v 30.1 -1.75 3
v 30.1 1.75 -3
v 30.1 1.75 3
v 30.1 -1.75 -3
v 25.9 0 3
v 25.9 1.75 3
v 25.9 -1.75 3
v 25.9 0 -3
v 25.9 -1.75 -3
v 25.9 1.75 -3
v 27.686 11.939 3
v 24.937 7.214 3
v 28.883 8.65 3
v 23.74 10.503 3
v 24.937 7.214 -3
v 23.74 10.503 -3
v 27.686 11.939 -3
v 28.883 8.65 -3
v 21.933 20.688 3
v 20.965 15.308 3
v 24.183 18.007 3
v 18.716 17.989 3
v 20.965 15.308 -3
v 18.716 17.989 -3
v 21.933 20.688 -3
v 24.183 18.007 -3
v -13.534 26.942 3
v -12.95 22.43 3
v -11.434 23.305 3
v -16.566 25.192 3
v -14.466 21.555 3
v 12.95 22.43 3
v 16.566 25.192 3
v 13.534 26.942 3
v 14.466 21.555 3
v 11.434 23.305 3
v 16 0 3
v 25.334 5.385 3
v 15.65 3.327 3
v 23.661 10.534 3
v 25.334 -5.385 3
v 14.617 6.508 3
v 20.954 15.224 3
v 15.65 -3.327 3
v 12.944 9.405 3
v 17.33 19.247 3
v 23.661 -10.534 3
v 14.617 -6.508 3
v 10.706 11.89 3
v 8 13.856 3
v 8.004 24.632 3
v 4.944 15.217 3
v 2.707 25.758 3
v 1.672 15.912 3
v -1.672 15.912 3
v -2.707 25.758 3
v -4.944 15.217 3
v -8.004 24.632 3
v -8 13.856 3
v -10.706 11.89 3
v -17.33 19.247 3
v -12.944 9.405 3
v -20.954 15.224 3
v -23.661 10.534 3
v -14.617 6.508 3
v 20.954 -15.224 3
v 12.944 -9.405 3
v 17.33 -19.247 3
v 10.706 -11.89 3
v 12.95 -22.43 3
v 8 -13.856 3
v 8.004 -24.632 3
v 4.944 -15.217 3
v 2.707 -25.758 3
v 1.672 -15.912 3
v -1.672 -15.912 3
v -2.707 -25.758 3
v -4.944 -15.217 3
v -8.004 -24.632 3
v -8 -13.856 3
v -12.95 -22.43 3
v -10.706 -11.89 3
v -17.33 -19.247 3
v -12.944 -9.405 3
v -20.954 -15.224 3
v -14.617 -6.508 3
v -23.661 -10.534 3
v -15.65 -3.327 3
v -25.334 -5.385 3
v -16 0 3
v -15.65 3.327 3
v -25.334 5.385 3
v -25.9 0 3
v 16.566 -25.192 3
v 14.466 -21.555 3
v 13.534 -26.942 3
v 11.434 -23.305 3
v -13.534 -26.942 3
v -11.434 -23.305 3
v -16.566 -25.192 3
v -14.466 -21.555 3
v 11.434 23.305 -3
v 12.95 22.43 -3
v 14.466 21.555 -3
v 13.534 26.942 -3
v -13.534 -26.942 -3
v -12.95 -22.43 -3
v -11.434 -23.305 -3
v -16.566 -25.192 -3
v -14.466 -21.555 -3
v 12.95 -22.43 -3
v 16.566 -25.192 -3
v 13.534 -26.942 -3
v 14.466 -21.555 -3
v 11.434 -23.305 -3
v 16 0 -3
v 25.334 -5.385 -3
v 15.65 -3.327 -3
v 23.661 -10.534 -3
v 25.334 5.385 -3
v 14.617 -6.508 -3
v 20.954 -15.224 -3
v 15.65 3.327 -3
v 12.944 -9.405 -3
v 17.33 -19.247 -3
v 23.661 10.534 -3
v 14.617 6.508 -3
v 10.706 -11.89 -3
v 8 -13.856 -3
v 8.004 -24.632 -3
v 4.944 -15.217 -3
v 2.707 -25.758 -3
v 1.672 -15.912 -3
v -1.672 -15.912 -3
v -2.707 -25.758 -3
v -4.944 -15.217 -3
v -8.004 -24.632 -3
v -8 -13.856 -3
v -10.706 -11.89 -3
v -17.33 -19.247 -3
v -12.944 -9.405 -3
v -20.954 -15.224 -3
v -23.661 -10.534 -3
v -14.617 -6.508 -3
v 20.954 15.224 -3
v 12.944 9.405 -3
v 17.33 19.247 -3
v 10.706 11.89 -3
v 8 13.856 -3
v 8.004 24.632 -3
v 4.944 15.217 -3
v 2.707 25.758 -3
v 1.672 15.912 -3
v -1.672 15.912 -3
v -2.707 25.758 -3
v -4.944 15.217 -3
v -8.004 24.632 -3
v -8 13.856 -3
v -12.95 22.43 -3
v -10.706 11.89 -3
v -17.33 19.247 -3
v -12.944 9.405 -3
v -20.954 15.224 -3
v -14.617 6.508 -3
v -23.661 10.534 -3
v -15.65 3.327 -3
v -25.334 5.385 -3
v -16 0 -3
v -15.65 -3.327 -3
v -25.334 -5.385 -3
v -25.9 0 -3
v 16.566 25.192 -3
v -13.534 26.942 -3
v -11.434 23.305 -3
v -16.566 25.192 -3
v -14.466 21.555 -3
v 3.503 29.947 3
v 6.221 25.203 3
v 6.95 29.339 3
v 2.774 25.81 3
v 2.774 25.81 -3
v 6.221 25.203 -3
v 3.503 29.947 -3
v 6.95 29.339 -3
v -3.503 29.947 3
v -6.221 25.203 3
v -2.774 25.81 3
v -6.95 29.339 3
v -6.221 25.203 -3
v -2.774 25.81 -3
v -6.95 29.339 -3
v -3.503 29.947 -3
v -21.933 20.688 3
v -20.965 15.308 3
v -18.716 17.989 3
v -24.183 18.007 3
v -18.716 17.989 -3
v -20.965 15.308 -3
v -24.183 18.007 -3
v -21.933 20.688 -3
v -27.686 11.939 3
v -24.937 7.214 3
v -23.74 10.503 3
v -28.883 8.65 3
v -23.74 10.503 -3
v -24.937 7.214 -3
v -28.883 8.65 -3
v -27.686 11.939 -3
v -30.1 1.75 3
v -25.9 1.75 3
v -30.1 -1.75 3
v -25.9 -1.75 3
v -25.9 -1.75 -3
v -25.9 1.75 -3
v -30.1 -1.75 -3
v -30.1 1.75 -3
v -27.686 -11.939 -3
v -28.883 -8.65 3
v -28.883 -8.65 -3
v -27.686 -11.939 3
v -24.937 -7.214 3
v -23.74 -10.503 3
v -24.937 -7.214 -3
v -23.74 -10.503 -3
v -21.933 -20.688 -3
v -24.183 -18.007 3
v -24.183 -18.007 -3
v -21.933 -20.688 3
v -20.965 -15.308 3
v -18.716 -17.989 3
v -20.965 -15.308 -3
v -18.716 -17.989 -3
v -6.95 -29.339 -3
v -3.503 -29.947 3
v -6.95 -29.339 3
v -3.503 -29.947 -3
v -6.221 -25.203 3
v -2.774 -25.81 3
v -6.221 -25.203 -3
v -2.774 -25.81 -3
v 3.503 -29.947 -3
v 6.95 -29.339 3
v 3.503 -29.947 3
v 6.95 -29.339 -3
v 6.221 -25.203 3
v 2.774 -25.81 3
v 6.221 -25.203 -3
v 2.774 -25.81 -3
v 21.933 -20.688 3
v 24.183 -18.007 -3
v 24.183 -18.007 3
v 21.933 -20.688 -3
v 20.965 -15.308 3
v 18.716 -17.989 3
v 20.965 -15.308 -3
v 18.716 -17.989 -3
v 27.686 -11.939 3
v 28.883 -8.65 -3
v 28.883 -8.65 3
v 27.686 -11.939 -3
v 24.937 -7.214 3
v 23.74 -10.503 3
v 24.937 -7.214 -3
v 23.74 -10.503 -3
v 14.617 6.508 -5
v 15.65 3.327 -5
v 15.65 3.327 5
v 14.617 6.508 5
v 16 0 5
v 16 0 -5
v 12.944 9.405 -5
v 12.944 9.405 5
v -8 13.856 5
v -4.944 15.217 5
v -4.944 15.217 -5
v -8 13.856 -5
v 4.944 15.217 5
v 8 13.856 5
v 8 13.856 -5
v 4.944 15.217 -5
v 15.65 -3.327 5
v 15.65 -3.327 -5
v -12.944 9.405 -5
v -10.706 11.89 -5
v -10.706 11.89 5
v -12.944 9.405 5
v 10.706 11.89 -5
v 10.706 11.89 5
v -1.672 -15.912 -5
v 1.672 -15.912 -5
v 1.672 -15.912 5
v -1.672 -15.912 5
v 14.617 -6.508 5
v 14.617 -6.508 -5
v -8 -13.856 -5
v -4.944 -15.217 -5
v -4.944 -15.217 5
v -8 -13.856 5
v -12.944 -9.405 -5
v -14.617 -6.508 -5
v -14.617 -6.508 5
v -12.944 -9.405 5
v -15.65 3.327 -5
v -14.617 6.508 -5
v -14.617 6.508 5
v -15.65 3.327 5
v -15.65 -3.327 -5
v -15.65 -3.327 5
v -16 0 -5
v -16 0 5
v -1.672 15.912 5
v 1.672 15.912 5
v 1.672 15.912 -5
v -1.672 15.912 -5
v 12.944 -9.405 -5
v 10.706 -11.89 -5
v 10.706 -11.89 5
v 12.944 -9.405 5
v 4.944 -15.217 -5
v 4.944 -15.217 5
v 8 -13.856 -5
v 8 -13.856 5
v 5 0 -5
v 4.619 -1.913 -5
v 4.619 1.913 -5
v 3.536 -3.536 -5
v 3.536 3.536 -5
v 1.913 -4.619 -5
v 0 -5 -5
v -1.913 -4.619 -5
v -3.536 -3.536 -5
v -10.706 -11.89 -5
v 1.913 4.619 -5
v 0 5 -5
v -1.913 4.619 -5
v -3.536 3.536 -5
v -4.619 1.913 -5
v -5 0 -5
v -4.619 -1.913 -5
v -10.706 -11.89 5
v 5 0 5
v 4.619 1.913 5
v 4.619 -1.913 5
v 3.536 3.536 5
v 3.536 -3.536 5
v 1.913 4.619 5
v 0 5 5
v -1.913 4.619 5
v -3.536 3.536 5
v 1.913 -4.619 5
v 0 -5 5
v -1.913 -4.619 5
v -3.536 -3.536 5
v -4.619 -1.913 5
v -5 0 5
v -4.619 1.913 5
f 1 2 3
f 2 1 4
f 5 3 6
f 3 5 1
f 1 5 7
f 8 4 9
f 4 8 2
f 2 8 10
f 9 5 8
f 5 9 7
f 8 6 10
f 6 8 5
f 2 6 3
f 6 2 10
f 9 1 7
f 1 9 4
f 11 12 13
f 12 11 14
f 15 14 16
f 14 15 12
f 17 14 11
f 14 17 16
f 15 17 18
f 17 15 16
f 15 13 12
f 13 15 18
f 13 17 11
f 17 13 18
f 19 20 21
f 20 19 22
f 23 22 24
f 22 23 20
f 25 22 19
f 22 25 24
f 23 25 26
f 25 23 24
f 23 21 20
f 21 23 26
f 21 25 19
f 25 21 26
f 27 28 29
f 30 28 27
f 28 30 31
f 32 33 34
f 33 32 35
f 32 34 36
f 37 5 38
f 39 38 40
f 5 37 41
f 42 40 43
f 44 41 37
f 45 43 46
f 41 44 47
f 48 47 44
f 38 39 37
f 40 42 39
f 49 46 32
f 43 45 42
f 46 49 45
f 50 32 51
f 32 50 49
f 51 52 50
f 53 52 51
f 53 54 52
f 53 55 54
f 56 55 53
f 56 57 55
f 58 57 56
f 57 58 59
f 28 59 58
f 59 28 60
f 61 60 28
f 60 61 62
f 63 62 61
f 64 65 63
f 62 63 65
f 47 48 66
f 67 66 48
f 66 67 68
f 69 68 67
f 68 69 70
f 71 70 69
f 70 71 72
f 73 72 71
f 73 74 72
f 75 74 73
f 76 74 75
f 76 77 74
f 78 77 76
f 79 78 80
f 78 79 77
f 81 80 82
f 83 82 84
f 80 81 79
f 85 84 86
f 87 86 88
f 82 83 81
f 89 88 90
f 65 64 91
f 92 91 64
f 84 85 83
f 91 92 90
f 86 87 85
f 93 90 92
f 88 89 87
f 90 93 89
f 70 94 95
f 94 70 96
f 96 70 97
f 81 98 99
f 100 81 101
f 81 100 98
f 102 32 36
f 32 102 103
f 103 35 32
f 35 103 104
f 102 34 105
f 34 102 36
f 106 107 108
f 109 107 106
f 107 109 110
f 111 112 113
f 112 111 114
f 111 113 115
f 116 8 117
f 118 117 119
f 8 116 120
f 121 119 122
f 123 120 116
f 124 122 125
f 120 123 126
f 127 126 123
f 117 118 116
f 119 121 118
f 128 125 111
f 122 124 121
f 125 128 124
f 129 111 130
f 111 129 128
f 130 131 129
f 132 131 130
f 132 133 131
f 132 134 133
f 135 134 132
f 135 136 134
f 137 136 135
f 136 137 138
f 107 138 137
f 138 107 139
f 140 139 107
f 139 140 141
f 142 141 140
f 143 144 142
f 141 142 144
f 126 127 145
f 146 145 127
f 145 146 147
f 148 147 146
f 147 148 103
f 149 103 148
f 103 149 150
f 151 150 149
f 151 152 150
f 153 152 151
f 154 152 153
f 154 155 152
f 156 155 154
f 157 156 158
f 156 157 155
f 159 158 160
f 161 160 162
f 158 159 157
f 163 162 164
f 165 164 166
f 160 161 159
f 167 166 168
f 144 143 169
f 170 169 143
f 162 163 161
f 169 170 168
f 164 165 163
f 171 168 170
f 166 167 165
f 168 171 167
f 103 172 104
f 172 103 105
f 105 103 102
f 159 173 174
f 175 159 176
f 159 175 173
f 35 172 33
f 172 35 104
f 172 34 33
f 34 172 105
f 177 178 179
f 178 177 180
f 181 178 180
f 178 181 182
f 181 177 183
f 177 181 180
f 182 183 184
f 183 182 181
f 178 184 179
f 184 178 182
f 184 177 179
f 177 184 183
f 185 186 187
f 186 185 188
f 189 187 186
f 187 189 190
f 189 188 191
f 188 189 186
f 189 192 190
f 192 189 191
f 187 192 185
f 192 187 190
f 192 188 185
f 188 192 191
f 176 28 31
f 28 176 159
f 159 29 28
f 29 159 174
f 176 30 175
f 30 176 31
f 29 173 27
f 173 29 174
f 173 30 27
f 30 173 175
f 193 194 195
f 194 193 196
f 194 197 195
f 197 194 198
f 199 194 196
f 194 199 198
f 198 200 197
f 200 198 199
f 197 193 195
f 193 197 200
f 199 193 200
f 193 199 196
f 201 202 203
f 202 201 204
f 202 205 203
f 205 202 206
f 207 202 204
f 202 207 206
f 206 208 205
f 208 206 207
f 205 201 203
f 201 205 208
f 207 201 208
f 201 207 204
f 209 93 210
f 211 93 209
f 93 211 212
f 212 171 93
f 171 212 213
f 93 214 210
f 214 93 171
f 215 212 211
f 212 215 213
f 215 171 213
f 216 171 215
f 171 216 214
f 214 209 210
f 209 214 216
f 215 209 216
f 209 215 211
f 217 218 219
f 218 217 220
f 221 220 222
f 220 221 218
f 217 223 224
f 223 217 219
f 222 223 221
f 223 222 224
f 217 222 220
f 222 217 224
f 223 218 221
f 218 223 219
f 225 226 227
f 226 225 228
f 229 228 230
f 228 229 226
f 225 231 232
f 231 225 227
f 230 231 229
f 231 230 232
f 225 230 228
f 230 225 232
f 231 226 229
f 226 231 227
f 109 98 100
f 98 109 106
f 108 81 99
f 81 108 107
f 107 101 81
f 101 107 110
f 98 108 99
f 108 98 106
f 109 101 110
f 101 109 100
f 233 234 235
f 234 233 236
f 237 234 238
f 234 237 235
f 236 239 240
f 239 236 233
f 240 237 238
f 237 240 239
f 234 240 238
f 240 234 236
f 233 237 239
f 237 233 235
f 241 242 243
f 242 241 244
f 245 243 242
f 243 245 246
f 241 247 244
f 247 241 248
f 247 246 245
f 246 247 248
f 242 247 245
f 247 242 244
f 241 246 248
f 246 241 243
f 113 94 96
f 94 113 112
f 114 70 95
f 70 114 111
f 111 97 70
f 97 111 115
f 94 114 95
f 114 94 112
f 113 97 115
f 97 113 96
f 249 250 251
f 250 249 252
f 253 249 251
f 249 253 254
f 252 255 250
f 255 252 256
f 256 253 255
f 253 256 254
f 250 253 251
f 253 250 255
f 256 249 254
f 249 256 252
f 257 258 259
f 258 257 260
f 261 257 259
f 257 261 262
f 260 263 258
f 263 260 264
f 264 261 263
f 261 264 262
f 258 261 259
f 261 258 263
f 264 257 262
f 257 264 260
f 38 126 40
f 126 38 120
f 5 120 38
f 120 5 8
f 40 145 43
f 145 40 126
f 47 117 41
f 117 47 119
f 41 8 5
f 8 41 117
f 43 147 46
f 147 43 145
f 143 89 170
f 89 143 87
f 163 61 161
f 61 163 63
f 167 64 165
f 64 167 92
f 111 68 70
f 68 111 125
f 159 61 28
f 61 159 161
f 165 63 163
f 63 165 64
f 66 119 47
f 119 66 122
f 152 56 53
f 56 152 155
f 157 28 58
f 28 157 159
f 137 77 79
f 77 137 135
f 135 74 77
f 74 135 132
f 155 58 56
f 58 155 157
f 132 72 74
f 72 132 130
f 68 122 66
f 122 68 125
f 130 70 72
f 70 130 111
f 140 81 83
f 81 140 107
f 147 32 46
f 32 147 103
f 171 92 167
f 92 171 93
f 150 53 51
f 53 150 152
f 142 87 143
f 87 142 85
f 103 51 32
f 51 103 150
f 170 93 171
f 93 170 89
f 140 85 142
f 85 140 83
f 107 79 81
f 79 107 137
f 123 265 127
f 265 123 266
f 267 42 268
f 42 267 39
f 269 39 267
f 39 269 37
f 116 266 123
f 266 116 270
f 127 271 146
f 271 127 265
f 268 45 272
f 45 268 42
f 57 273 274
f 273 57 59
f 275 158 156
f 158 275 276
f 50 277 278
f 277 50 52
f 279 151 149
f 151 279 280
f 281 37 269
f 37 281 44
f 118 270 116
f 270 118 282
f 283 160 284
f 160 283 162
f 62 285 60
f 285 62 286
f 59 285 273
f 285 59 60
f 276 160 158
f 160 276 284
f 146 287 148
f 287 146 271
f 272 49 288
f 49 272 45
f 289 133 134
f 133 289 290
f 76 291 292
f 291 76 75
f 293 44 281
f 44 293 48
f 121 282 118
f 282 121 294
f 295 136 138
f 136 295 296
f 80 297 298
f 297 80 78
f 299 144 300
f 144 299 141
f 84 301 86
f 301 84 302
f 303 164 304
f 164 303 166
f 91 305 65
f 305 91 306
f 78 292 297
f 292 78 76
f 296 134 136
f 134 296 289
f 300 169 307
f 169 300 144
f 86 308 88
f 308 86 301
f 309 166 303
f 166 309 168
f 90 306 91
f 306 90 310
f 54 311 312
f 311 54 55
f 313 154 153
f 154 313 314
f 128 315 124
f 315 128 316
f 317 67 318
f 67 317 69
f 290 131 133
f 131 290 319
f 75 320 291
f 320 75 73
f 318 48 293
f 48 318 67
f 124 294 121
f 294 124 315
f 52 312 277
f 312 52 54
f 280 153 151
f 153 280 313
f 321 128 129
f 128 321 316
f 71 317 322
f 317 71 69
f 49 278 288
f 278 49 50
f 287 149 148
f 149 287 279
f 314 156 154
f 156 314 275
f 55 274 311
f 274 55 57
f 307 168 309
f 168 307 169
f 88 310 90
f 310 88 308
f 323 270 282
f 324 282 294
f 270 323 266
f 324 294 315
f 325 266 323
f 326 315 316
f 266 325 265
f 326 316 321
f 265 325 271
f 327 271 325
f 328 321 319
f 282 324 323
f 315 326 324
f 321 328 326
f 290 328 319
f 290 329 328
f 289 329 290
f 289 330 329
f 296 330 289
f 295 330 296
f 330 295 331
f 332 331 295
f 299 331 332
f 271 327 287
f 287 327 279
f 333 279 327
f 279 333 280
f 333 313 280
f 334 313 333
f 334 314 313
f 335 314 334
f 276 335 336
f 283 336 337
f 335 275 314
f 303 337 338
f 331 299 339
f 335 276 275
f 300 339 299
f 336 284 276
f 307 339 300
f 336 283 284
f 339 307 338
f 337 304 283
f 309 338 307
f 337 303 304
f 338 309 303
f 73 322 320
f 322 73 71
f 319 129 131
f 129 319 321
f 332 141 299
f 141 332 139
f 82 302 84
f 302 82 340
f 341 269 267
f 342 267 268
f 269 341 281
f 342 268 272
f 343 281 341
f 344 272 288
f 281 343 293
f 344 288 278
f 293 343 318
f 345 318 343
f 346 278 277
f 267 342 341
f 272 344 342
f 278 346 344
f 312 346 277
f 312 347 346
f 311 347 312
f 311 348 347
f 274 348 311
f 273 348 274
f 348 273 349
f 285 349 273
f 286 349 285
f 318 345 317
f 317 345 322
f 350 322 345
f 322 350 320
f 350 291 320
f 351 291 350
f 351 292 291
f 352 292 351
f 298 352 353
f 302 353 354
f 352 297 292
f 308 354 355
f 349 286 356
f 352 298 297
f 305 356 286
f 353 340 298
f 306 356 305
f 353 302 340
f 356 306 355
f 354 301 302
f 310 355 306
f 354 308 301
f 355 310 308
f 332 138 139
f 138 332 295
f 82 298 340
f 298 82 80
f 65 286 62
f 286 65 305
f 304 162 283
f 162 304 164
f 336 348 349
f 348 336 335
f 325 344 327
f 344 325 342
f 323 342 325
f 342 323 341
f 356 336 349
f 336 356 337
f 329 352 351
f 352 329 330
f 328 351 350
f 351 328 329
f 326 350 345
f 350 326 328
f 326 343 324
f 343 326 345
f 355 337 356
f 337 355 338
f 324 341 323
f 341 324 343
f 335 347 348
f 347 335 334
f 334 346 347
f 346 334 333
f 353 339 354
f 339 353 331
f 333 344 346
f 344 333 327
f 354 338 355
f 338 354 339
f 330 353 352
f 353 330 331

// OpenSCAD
// ========================================================
// Parametric 3D Spur Gear
// ========================================================

// Primary Gear Parameters
num_teeth = 18;
pitch_radius = 28;
thickness = 6;
shaft_radius = 5;

// Calculated structural parameters
tooth_width = 3.5;
tooth_depth = 4.2;
hub_radius = 16;
hub_thickness = 10;

// Radially placed gear teeth
module gear_teeth() {
    // 360 / 18 teeth = 20-degree increments
    for (angle = [0:20:340]) {
        rotate([0, 0, angle]) {
            // Position the tooth at the gear's perimeter
            translate([pitch_radius, 0, 0]) {
                // Renders a perfectly centered gear tooth
                cube([tooth_depth, tooth_width, thickness], center=true);
            }
        }
    }
}

// Assemble the final gear structure
difference() {
    union() {
        // Main gear blank disc (using minor/dedendum radius)
        cylinder(h=thickness, r=pitch_radius - tooth_depth * 0.5, center=true);
        
        // Raised center hub to support axle loading
        cylinder(h=hub_thickness, r=hub_radius, center=true);
        
        // Radial array of gear teeth
        gear_teeth();
    }
    
    // Subtracted core shaft cutout through the center of the gear
    cylinder(h=hub_thickness + 2, r=shaft_radius, center=true);
}
